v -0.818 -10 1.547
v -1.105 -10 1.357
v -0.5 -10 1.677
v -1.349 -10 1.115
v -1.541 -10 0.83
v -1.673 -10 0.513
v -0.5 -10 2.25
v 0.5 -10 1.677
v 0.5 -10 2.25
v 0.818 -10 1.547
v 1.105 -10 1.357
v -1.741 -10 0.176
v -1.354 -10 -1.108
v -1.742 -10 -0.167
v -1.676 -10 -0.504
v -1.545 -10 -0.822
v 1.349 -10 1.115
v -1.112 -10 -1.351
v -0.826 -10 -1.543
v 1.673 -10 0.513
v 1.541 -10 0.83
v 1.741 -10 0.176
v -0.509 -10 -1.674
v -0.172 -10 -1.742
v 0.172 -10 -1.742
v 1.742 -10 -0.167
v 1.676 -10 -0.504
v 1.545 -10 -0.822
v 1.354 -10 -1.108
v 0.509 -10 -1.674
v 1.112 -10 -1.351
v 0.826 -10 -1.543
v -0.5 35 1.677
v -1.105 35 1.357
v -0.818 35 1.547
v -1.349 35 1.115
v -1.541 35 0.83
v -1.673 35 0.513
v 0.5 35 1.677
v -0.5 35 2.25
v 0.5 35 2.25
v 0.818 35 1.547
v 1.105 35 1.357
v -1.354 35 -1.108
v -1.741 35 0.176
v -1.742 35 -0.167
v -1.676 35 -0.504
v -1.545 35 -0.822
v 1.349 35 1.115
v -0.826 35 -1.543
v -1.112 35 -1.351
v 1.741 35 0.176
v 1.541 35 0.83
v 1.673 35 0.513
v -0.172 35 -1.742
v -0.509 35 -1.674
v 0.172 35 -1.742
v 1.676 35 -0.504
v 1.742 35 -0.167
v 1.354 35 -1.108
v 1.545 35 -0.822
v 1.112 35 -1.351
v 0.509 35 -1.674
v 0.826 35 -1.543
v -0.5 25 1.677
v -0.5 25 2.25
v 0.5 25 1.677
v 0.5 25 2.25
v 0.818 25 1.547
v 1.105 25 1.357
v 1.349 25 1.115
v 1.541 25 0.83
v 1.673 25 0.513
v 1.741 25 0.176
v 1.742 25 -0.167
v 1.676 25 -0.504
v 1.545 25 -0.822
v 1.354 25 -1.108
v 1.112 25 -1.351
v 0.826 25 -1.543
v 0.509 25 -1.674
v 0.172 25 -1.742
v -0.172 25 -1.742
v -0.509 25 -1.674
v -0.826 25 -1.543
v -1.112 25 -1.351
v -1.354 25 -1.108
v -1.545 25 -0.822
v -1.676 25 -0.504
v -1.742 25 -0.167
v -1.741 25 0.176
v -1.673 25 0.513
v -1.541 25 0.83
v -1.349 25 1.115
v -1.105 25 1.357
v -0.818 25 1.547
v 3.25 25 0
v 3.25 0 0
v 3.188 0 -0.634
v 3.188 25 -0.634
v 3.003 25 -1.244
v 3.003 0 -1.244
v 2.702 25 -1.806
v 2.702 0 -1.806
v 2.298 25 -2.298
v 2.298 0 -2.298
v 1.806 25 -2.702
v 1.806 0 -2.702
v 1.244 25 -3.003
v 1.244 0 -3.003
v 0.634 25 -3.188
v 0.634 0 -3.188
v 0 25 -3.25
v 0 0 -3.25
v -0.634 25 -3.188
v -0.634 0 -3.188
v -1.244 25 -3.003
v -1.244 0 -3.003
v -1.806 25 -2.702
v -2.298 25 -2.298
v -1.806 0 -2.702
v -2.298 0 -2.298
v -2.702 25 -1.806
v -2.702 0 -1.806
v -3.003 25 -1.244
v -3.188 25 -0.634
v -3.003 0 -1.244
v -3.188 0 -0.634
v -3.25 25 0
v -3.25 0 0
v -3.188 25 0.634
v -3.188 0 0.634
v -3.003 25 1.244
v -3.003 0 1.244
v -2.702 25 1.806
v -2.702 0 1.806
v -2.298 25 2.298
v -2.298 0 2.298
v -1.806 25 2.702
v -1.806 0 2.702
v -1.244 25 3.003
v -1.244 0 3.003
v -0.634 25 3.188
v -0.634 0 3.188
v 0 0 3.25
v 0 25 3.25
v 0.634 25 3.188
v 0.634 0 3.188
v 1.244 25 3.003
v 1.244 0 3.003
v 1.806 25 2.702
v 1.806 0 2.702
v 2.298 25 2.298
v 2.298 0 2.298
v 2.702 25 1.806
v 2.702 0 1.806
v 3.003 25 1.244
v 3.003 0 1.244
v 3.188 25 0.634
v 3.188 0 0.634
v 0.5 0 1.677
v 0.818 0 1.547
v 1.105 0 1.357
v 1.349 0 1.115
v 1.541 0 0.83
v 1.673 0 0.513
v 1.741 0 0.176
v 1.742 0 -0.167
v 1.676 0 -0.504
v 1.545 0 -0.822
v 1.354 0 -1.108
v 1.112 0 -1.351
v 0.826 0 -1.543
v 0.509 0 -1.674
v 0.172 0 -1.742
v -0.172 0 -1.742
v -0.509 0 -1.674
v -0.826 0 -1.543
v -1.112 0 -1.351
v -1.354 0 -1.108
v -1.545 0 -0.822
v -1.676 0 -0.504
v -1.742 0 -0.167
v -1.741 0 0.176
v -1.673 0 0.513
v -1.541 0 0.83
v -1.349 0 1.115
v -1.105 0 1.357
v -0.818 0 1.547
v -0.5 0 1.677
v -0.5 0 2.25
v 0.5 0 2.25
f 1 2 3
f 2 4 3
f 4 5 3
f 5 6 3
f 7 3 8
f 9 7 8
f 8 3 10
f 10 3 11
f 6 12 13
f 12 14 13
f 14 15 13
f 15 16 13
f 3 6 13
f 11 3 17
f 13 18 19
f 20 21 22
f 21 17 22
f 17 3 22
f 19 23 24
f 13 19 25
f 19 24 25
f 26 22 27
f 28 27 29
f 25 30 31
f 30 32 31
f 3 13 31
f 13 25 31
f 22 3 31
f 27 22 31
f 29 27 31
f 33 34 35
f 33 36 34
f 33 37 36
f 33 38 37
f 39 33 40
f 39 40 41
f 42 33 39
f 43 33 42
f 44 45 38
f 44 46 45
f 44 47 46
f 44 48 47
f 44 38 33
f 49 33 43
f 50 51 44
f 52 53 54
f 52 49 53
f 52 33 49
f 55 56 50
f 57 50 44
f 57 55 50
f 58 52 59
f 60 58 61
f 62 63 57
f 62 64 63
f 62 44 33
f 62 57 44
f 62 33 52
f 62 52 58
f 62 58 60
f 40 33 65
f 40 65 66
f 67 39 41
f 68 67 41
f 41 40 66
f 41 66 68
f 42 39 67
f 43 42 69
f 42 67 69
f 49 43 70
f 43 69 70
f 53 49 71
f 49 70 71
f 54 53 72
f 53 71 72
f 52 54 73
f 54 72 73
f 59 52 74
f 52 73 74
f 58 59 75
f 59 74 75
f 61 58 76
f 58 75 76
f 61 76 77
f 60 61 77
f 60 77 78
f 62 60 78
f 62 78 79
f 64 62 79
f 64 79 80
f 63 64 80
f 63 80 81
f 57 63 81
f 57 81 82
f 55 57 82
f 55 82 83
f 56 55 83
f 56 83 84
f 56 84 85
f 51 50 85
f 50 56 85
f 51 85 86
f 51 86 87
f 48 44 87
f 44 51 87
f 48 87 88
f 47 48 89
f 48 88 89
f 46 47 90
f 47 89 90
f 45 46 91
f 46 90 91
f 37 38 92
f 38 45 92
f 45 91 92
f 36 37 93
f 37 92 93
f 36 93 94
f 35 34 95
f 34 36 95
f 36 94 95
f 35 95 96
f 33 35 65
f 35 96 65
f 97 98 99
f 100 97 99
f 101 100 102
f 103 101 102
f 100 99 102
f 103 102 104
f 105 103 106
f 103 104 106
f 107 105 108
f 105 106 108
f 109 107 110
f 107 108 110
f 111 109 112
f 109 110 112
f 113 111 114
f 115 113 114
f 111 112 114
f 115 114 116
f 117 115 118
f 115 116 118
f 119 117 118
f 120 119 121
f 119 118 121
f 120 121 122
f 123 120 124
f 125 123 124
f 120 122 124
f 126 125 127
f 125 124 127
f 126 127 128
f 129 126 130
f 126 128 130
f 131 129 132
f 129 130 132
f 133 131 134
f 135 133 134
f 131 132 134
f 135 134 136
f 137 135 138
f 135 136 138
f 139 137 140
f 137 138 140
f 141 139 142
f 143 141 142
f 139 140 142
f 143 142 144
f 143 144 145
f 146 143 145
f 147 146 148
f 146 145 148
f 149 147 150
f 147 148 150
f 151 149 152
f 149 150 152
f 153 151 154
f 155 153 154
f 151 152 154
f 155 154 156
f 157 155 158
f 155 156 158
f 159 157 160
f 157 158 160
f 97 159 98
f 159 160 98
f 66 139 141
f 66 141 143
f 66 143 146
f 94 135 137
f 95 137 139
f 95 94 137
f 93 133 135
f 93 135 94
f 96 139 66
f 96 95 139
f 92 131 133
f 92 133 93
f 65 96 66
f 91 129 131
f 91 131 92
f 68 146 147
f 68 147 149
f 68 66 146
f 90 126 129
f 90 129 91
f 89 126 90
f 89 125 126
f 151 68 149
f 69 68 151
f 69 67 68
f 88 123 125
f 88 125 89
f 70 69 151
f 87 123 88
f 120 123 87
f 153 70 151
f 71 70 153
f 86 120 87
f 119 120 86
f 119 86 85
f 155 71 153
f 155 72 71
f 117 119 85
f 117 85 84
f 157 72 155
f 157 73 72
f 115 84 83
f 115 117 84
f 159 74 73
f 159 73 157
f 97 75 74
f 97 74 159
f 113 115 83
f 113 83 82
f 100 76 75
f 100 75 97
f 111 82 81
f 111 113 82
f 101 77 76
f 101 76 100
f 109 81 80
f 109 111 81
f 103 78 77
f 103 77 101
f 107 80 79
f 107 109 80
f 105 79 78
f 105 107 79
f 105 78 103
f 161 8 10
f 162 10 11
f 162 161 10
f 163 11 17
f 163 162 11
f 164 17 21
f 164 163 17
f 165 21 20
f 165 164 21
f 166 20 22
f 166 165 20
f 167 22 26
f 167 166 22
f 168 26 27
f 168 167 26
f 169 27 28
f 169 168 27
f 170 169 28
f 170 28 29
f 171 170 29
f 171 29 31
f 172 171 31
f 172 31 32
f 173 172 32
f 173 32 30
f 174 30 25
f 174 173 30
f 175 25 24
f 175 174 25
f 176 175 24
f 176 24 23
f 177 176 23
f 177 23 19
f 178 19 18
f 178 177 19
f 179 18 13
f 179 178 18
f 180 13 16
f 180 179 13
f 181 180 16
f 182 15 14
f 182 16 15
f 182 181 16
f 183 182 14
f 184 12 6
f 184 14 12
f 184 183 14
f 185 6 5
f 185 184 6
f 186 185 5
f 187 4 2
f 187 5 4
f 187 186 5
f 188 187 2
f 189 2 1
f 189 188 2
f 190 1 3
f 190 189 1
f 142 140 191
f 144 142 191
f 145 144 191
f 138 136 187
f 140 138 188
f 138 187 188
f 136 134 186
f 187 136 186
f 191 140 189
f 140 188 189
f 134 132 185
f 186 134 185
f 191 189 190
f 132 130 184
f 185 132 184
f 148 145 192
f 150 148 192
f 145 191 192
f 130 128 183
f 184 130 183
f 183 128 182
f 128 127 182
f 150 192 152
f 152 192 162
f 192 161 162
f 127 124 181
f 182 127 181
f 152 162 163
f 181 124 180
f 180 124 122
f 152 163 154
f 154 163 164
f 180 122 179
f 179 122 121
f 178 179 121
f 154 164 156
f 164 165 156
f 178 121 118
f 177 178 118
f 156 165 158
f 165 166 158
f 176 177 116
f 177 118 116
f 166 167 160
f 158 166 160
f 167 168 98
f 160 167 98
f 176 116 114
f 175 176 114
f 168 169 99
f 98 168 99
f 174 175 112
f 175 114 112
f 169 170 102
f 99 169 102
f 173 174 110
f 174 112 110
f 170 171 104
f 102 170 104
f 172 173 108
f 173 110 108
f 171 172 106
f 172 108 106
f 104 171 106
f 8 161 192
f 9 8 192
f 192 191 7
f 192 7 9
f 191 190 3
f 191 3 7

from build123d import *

# Parameters (mm, degrees)
SKETCH1_R                = 3.25
BOSS_EXTRUDE1_DEPTH      = 25
SKETCH2_R                = 1.75
BOSS_EXTRUDE2_DEPTH      = 10
BOSS_EXTRUDE2_DEPTH_BACK = 35
BOSS_EXTRUDE3_START      = -45
SKETCH3_W                = 1
SKETCH3_H                = 1
BOSS_EXTRUDE3_DEPTH      = 45


with BuildPart() as part:
    # Sketch1 → Boss-Extrude1 (new body)
    with BuildSketch(Plane(origin=(0, 0, 0), x_dir=(1, 0, 0), z_dir=(0, 1, 0))):
        Circle(SKETCH1_R)
    extrude(amount=BOSS_EXTRUDE1_DEPTH)

    # Sketch2 → Boss-Extrude2 (add, two sides)
    with BuildSketch(Plane(origin=(0, 25, 0), x_dir=(1, 0, 0), z_dir=(0, 1, 0))) as boss_extrude2_sk:
        Circle(SKETCH2_R)
    extrude(amount=BOSS_EXTRUDE2_DEPTH)
    extrude(boss_extrude2_sk.sketch, amount=-BOSS_EXTRUDE2_DEPTH_BACK)

    # Sketch3 → Boss-Extrude3 (add)
    with BuildSketch(Plane.XZ.offset(10).offset(BOSS_EXTRUDE3_START)):
        with Locations((0, 1.75)):
            Rectangle(SKETCH3_W, SKETCH3_H)
    extrude(amount=BOSS_EXTRUDE3_DEPTH)


solid = part.part
